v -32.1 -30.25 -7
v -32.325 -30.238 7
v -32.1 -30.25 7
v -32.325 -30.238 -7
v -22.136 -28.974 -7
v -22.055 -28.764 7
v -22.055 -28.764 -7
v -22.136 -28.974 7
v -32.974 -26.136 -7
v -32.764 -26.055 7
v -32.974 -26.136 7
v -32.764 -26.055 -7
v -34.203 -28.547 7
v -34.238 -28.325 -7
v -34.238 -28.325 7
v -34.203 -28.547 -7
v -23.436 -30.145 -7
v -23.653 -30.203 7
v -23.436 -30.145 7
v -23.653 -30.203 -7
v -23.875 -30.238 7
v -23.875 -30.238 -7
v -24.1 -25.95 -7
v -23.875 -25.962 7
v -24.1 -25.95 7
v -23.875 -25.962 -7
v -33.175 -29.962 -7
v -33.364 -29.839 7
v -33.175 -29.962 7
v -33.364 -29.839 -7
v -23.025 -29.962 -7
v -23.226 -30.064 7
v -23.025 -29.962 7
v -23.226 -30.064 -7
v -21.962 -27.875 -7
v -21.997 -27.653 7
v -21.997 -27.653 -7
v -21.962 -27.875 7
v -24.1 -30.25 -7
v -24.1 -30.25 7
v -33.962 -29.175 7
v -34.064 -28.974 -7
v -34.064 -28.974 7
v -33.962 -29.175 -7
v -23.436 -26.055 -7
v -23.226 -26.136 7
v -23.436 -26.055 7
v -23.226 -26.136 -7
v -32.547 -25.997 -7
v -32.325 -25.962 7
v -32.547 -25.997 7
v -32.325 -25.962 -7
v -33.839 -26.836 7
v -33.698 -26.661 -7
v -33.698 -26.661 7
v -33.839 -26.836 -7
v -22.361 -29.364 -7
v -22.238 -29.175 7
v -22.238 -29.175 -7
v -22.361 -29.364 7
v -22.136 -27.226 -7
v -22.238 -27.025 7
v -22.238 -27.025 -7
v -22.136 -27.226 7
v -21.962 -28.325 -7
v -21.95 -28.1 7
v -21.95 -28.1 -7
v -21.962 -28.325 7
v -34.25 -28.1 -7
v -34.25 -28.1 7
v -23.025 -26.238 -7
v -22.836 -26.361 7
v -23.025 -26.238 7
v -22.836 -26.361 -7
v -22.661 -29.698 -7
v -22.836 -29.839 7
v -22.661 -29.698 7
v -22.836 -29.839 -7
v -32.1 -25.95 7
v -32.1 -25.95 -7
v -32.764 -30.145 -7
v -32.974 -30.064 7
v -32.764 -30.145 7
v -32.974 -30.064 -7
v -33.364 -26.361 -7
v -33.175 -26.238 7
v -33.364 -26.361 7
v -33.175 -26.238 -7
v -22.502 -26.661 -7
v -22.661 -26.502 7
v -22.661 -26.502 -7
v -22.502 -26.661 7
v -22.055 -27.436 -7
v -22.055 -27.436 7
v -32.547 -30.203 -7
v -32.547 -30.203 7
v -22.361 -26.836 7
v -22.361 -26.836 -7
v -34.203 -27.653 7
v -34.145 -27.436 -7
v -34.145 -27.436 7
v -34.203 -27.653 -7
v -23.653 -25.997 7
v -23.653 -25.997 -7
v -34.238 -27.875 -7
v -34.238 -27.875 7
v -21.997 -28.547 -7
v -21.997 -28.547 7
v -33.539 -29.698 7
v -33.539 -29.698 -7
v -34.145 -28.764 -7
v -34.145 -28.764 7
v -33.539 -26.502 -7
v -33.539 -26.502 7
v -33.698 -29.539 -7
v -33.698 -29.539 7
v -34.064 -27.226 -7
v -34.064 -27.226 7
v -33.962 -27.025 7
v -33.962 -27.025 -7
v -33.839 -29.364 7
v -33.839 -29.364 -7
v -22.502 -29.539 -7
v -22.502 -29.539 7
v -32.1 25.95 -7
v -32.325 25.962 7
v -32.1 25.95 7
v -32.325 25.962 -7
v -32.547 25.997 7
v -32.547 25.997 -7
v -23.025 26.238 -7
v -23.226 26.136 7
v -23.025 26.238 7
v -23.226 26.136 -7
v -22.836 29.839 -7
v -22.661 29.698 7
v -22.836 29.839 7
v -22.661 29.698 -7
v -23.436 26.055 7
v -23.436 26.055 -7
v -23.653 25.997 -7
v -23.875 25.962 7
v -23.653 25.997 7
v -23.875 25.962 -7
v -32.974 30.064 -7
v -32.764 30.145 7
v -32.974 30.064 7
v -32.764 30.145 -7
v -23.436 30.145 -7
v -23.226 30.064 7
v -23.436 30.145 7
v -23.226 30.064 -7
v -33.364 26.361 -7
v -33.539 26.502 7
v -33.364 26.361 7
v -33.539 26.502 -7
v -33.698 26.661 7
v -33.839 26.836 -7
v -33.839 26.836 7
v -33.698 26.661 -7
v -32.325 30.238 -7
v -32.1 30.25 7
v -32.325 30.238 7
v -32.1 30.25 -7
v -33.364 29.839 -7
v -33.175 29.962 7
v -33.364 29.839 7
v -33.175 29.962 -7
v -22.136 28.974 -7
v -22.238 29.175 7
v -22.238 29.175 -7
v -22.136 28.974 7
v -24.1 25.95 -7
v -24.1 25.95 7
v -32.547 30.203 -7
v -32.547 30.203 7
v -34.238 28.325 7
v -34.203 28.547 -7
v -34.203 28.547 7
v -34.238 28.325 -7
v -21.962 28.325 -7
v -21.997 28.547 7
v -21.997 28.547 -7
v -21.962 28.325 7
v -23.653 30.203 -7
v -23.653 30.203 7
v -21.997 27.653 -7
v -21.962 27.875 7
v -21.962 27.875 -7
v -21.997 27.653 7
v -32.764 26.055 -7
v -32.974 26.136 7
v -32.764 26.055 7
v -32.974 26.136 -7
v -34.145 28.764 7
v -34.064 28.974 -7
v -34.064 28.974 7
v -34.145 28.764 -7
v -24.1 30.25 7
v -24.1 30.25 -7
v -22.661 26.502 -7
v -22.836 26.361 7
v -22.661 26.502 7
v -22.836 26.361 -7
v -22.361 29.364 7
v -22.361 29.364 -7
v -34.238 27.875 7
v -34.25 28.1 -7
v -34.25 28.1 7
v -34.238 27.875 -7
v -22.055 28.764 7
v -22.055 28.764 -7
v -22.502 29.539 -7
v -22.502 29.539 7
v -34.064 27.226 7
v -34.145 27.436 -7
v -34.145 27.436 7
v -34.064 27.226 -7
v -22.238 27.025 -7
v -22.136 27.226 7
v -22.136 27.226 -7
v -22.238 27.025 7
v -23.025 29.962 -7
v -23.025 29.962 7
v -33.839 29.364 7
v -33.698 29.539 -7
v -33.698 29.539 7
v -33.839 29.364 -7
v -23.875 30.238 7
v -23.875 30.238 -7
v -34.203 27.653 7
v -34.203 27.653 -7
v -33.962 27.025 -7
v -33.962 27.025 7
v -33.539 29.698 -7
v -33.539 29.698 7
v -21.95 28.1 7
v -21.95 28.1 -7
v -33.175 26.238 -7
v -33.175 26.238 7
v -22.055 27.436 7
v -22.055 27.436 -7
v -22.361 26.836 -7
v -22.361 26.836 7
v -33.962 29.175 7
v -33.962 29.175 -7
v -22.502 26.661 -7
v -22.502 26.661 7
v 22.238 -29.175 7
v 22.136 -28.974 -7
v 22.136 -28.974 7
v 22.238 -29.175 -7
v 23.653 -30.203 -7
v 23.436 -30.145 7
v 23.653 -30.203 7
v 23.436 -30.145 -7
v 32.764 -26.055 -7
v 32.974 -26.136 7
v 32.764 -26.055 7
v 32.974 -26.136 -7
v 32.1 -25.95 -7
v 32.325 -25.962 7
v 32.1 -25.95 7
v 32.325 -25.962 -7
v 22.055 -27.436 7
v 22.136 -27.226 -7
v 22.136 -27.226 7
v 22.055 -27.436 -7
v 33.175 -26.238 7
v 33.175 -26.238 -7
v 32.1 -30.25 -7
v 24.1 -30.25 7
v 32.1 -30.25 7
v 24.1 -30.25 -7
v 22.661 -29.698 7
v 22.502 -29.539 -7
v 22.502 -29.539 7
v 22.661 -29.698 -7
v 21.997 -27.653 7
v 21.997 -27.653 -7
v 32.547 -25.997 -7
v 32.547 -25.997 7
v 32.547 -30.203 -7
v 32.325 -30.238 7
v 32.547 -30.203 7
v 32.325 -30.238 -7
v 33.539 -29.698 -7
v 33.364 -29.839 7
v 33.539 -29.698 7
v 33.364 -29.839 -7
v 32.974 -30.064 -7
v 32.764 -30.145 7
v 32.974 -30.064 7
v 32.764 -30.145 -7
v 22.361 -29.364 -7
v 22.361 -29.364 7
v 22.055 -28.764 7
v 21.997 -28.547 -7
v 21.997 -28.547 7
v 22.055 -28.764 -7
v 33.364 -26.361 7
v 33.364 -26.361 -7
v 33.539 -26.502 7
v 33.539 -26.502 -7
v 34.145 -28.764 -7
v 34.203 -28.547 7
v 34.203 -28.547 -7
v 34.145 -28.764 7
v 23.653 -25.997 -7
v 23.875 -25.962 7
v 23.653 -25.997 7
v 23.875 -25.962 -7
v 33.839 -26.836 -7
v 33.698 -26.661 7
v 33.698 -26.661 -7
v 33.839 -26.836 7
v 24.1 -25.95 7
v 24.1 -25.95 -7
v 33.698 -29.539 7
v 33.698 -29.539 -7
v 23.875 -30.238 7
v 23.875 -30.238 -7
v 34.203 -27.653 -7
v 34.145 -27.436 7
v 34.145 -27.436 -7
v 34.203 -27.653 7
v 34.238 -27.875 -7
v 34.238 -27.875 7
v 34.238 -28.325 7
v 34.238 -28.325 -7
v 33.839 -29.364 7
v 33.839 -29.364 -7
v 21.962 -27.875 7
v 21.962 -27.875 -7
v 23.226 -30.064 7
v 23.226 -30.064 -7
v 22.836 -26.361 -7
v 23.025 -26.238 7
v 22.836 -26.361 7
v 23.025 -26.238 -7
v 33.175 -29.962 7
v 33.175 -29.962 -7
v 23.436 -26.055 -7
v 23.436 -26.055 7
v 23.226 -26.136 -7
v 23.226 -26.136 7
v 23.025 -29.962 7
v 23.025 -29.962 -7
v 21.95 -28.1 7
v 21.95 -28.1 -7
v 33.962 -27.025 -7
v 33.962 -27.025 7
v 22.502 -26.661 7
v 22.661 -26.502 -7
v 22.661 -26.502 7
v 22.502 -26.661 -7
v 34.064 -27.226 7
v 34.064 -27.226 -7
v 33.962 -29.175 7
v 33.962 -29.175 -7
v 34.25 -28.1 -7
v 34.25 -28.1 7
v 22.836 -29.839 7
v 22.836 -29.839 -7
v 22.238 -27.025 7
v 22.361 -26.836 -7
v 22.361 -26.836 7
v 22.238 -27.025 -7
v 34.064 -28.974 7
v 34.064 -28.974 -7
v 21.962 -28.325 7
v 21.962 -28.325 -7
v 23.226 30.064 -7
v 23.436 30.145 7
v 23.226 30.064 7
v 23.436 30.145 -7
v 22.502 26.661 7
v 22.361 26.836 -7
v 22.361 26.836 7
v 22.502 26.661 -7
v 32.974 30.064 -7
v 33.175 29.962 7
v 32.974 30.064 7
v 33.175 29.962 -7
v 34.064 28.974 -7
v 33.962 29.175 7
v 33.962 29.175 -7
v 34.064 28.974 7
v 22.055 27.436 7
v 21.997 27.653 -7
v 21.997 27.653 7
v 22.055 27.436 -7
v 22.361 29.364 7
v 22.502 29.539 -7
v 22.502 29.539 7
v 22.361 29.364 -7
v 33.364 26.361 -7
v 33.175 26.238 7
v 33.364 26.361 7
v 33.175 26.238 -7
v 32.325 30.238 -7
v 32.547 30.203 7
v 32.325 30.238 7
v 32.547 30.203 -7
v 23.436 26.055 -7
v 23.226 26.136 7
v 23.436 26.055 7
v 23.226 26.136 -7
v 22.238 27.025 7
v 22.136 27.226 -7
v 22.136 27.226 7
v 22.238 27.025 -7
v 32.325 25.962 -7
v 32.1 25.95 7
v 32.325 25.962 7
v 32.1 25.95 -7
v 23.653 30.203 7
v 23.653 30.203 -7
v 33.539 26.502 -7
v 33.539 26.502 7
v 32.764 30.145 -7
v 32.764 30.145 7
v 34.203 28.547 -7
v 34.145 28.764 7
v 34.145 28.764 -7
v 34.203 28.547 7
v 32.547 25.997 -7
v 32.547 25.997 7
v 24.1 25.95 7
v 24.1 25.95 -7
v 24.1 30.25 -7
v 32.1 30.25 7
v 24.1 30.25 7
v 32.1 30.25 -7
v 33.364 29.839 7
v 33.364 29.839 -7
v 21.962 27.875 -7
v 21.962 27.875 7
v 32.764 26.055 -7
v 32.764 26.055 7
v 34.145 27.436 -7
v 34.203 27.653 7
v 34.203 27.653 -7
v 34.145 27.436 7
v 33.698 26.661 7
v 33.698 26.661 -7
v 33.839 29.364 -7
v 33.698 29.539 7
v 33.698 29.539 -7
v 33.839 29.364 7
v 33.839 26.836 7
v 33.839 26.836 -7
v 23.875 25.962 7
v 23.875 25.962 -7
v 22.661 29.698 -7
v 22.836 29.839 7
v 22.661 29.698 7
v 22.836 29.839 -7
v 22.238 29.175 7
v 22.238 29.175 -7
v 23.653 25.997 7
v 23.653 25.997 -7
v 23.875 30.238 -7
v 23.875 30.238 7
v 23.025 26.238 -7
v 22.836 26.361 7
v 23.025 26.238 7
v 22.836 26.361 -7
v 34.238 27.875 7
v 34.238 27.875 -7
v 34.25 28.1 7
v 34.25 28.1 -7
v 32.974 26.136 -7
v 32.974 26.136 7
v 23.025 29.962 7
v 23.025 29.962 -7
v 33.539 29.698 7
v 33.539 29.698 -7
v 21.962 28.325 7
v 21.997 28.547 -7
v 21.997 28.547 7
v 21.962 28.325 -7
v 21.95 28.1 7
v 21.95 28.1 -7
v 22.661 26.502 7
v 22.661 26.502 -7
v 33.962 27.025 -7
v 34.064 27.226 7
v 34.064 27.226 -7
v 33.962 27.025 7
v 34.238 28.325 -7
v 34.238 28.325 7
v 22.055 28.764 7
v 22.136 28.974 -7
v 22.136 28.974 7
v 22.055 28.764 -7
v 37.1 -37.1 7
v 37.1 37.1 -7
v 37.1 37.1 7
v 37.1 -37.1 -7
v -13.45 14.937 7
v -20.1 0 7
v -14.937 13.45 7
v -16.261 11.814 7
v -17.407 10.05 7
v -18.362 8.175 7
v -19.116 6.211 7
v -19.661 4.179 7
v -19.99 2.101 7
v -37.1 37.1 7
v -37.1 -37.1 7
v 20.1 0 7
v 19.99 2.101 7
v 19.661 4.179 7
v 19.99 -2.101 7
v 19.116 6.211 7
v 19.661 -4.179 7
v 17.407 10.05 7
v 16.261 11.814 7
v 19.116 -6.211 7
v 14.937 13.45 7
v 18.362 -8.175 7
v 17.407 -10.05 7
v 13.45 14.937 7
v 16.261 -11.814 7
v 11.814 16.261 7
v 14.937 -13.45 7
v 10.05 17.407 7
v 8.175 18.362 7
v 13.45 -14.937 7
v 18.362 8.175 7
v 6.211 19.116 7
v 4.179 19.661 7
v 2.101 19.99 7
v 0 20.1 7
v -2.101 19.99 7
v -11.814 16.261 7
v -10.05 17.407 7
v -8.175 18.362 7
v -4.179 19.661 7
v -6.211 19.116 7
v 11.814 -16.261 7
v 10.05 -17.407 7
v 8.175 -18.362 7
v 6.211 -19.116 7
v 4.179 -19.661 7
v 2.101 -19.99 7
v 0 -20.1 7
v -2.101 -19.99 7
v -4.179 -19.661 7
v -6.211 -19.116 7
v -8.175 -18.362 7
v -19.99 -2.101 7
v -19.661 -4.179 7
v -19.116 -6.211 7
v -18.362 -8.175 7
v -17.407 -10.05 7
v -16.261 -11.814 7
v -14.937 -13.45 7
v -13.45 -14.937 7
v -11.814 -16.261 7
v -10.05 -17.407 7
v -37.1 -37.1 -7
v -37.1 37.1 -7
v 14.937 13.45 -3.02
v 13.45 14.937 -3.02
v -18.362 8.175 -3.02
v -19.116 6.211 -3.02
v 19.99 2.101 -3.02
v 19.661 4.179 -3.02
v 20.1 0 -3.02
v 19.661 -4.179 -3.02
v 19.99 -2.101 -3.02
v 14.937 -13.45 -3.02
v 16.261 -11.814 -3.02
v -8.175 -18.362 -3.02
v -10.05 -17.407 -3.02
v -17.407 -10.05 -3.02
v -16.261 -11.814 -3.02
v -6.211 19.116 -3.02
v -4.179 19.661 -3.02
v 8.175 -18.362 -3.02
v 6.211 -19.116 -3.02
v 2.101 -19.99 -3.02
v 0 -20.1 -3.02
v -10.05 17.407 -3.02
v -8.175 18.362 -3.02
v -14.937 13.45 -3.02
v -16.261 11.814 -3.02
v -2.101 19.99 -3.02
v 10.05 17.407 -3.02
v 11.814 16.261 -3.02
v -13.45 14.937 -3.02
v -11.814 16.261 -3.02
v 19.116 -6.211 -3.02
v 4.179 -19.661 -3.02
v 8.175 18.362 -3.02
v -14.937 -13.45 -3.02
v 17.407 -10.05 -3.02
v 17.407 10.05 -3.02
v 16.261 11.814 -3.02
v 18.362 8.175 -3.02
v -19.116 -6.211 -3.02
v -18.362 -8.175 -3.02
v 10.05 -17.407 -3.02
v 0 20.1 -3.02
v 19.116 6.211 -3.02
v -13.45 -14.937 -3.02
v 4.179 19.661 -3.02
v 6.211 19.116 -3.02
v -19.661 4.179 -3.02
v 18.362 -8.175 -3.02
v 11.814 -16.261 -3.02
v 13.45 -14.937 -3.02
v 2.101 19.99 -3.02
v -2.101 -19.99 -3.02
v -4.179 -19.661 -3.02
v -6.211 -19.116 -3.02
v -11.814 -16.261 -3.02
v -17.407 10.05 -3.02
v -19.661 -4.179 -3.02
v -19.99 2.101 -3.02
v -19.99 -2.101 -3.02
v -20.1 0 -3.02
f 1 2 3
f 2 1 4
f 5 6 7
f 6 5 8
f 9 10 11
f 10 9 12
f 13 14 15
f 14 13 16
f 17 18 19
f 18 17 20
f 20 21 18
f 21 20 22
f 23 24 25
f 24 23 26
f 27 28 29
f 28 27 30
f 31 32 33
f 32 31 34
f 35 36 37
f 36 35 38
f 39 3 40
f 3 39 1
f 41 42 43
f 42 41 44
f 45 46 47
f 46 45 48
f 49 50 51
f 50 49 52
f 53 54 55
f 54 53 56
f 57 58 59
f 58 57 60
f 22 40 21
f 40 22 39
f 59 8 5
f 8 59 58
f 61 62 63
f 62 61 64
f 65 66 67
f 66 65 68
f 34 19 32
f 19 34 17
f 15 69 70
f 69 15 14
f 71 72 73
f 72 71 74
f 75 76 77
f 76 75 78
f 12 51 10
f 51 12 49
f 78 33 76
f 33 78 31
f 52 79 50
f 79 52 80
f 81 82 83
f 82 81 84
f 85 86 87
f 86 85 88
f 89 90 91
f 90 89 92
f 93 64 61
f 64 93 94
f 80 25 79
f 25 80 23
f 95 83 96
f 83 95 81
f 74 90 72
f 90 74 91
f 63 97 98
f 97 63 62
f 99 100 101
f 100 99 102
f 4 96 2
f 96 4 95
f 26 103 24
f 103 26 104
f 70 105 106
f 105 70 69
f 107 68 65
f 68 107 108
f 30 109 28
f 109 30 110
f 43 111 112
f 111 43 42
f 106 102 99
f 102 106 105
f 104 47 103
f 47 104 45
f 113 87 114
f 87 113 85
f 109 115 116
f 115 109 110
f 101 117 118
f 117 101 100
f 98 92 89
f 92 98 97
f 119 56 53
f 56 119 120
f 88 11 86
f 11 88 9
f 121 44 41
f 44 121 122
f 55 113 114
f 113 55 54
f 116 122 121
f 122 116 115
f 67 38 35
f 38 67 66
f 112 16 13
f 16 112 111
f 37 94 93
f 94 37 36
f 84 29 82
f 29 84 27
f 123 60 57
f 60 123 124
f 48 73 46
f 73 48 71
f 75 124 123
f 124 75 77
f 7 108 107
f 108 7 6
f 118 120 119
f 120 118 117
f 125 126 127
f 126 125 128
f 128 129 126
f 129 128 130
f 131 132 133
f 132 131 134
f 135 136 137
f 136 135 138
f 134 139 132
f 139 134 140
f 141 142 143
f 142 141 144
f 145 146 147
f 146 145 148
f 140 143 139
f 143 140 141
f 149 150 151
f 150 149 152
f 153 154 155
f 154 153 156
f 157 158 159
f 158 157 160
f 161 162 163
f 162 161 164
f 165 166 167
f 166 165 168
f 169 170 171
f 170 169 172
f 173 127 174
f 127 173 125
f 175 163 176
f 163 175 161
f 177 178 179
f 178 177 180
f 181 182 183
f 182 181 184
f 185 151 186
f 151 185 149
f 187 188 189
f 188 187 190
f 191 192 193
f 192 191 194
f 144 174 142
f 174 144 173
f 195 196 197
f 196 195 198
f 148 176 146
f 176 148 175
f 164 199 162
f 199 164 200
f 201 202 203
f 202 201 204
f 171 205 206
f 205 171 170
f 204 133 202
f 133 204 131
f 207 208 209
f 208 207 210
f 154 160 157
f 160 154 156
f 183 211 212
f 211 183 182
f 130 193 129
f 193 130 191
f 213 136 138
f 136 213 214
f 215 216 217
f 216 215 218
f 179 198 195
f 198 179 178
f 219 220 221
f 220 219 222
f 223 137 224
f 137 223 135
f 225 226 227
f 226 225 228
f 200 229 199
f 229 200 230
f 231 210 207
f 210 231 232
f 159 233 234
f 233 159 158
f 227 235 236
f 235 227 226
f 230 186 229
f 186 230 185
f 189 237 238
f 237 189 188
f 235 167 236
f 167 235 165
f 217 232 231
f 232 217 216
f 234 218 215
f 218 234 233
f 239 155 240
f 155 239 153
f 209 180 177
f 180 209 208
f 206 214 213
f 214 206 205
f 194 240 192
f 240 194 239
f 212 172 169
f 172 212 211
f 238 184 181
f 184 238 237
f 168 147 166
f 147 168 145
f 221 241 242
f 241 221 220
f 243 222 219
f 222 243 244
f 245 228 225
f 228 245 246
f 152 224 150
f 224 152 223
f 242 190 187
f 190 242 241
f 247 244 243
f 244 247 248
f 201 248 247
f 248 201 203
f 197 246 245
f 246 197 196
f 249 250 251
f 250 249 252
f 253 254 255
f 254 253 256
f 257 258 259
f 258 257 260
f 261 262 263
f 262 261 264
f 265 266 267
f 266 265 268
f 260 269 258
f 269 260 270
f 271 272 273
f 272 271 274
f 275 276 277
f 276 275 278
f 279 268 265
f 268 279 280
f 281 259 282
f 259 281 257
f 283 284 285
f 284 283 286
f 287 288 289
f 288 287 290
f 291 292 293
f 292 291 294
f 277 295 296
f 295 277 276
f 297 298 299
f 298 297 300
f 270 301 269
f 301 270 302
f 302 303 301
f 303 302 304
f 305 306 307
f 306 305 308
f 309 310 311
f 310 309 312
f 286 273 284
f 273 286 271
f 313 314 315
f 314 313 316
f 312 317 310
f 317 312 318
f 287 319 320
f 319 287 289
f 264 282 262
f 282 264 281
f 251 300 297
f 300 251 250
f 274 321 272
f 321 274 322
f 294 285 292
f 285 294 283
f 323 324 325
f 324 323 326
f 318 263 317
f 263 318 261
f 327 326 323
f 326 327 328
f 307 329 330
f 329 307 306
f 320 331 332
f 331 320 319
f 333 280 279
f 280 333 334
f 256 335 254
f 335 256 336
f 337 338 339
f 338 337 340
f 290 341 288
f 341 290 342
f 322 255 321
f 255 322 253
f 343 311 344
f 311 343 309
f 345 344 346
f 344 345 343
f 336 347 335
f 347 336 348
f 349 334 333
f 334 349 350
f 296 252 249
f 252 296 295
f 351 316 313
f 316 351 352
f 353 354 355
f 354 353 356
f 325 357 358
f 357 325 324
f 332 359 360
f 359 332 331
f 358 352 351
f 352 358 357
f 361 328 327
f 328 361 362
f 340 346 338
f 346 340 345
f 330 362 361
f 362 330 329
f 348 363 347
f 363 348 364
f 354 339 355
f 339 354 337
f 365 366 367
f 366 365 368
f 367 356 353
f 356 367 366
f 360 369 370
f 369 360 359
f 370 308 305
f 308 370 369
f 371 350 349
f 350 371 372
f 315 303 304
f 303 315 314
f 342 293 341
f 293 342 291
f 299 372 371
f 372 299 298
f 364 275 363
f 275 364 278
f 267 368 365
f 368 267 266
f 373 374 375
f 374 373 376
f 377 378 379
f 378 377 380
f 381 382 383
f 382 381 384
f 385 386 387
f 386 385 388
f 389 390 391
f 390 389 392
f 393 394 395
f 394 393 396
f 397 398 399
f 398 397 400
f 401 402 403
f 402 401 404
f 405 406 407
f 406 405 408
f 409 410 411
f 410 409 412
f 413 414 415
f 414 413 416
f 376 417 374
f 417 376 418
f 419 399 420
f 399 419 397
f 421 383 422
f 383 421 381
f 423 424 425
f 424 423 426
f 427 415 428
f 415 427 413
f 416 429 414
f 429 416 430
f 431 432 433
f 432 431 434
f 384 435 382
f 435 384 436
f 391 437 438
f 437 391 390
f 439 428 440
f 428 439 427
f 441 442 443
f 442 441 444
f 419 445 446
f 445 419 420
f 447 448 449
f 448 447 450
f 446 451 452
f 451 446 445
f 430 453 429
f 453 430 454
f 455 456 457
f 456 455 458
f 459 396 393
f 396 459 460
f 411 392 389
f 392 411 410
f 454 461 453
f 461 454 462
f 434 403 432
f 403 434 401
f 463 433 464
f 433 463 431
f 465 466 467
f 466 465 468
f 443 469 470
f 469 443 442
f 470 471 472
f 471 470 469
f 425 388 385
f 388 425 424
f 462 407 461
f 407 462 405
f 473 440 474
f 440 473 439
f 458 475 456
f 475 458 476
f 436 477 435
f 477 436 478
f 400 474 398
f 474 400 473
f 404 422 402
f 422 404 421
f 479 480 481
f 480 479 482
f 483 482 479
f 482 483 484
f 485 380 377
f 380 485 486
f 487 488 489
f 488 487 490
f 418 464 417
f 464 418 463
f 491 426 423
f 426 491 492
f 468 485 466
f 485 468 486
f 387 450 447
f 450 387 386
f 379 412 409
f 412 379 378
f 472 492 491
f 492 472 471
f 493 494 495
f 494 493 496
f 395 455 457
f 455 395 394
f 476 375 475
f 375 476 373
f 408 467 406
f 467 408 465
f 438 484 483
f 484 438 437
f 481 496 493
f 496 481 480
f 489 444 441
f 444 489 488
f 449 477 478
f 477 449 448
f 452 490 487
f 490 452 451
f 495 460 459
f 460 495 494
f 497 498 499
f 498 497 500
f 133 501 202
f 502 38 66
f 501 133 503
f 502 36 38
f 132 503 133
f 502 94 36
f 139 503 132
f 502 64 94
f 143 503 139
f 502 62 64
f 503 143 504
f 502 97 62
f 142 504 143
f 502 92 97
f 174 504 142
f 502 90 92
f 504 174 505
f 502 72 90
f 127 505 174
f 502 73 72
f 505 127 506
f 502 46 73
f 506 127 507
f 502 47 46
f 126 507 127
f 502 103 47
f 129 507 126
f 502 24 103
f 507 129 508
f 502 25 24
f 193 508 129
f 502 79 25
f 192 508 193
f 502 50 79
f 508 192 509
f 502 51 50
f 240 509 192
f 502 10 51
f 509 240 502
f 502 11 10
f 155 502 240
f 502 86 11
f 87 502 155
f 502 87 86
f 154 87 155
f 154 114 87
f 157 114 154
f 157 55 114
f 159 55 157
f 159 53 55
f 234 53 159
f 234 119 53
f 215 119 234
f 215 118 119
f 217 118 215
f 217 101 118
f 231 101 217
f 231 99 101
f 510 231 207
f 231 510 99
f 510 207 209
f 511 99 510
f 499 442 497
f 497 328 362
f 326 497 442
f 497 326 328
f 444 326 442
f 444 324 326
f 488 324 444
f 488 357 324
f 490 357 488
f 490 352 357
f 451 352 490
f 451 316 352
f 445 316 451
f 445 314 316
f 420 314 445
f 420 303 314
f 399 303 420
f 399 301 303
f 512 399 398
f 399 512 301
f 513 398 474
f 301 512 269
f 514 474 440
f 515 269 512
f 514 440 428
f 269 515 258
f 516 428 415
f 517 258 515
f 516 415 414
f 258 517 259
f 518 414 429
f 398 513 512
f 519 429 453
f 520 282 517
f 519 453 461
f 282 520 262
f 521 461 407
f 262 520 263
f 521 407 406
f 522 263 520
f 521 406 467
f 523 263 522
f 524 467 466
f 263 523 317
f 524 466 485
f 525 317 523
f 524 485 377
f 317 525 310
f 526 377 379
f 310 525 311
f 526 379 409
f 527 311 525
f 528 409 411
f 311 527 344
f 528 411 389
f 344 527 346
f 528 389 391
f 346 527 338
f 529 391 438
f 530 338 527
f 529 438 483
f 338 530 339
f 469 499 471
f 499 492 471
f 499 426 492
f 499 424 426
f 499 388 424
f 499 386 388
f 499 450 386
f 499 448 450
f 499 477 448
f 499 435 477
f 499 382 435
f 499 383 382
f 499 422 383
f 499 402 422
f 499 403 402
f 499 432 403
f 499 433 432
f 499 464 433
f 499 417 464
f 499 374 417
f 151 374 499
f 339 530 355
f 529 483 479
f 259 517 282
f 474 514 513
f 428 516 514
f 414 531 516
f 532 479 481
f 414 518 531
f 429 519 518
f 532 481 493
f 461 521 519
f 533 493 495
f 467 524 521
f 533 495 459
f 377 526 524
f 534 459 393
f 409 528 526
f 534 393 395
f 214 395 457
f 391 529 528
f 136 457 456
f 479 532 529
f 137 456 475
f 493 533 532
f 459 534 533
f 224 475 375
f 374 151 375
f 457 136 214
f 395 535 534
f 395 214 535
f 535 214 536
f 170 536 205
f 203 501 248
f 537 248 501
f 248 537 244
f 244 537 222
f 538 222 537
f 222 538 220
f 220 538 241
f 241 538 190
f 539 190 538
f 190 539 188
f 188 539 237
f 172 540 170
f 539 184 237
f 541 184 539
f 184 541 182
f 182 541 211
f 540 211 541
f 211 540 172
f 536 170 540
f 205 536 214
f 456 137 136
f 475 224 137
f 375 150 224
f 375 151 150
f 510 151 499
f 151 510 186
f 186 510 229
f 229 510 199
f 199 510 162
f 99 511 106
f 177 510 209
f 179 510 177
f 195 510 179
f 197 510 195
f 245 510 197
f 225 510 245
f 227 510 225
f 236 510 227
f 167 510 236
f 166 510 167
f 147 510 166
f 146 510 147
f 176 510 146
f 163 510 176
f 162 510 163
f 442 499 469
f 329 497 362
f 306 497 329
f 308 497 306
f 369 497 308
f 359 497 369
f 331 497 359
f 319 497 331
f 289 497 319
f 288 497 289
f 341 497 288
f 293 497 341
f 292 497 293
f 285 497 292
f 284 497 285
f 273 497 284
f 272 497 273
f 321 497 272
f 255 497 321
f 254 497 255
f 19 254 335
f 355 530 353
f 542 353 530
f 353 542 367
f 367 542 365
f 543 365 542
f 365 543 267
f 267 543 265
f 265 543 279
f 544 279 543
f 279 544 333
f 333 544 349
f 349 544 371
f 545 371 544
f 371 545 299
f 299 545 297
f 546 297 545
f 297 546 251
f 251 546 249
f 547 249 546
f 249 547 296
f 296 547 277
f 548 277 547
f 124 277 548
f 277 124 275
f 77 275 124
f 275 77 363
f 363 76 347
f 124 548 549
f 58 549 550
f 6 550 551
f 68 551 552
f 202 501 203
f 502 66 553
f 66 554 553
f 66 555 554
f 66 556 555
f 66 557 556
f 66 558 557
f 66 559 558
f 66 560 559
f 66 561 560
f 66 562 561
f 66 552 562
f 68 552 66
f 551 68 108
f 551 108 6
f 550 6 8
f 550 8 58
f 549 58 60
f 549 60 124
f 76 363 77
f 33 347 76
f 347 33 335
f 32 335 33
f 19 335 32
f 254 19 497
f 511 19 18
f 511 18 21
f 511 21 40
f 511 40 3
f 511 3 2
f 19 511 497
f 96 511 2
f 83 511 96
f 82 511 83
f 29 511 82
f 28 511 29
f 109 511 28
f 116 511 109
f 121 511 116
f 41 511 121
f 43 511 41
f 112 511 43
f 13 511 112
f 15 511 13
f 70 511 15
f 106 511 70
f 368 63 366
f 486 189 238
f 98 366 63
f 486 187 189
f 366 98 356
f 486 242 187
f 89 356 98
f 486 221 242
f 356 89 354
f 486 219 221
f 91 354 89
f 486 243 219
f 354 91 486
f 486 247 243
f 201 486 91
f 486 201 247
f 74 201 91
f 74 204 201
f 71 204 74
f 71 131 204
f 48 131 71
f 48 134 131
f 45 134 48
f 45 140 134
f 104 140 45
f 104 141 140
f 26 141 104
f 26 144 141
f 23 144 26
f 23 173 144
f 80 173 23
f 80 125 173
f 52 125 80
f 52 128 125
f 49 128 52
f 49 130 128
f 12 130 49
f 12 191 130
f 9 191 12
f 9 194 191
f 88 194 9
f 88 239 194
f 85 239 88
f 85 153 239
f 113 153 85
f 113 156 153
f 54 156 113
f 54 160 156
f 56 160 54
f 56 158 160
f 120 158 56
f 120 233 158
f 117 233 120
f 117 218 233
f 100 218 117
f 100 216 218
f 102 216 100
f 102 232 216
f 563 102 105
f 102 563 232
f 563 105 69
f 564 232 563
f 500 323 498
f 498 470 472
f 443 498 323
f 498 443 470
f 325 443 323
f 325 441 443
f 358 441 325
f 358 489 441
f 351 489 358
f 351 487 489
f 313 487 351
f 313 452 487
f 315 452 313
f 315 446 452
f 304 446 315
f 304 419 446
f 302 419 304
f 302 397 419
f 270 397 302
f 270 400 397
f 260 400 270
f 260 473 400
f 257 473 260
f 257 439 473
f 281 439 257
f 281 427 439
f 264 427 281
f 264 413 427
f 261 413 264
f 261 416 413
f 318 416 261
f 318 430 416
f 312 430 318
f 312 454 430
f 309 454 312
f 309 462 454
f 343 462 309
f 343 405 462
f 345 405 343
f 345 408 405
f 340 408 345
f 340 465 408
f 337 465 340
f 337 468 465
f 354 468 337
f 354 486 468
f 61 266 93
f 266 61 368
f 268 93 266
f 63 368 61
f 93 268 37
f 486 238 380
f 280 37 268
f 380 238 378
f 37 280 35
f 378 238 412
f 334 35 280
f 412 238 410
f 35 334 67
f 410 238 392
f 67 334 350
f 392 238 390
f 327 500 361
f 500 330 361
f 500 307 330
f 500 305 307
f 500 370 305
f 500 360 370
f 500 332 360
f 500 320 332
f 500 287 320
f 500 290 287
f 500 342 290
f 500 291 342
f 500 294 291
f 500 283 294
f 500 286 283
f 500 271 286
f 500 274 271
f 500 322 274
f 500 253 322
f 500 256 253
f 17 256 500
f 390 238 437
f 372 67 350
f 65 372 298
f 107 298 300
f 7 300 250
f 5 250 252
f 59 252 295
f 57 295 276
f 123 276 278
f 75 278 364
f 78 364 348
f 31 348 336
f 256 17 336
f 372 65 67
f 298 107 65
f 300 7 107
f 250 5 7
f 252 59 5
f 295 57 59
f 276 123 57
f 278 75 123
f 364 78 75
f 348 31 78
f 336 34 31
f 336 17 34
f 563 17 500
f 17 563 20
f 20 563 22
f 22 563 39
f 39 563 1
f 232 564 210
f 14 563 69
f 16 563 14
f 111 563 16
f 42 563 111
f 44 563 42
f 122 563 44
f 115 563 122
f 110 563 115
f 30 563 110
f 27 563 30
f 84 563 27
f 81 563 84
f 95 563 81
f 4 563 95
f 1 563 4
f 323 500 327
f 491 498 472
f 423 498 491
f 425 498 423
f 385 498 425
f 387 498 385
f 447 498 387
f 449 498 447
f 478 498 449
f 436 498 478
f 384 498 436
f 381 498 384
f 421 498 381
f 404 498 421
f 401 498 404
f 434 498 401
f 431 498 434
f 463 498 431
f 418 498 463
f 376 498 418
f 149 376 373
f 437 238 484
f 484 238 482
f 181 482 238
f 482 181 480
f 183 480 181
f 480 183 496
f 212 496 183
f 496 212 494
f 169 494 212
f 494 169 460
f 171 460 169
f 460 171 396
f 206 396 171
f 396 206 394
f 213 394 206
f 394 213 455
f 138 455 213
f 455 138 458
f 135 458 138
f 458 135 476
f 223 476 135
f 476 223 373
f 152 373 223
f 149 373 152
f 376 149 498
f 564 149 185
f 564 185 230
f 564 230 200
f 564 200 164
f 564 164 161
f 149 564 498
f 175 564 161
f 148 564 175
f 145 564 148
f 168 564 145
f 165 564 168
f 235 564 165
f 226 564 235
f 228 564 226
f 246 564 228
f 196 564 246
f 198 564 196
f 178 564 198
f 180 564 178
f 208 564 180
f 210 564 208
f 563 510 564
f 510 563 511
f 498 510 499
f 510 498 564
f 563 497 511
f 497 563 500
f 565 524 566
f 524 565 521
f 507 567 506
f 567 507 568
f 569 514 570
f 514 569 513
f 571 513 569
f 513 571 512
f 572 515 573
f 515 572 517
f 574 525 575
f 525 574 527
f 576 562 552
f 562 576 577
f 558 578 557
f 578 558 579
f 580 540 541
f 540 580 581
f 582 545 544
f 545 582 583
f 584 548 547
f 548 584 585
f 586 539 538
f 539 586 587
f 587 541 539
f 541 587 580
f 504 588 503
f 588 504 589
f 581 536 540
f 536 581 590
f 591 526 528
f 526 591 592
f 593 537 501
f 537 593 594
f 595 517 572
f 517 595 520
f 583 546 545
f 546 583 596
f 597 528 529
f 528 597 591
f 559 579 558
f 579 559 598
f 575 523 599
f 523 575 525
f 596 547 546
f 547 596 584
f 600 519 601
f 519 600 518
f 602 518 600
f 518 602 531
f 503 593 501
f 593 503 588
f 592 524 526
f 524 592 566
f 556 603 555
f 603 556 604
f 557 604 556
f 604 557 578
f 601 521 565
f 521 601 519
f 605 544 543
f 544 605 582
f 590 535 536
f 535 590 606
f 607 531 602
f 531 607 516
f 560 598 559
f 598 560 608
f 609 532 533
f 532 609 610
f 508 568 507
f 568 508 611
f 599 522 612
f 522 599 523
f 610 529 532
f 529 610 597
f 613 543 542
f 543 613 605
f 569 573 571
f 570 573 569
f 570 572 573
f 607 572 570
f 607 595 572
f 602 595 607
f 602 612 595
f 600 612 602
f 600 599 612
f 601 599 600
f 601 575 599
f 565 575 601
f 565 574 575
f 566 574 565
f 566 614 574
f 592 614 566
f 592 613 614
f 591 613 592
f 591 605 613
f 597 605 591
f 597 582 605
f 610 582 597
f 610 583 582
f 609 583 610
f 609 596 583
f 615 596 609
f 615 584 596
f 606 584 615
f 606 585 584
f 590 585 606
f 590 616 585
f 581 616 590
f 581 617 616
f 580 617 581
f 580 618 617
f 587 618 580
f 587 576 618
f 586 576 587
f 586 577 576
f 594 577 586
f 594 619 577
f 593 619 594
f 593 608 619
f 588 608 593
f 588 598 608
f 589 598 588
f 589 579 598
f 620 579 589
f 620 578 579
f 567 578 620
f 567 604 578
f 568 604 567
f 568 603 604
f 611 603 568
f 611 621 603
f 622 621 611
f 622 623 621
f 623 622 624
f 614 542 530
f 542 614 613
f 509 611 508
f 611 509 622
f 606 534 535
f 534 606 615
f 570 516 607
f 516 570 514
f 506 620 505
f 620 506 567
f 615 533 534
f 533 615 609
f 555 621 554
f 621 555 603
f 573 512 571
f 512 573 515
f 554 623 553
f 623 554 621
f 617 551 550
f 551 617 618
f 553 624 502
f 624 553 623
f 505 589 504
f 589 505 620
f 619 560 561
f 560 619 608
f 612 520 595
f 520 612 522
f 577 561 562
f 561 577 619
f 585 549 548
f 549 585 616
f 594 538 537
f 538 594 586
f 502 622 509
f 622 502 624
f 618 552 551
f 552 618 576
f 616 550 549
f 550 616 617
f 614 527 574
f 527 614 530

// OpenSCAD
// Bearing mounting plate with 40.2 mm pocket.
$fn = 60;
eps = 0.02;
plate_w = 74.2;
plate_t = 14;
bearing_d = 40.2;
pocket_d = 10;
mount_pitch = 56.2;
module slot(x, y) {
    hull() {
        translate([x - 4, y, -plate_t / 2 - eps]) cylinder(d = 4.3, h = plate_t + 2 * eps);
        translate([x + 4, y, -plate_t / 2 - eps]) cylinder(d = 4.3, h = plate_t + 2 * eps);
    }
}
difference() {
    cube([plate_w, plate_w, plate_t], center = true);
    translate([0, 0, plate_t / 2 - pocket_d - eps]) cylinder(d = bearing_d, h = pocket_d + 2 * eps);
    for (x = [-mount_pitch / 2, mount_pitch / 2], y = [-mount_pitch / 2, mount_pitch / 2]) slot(x, y);
}
